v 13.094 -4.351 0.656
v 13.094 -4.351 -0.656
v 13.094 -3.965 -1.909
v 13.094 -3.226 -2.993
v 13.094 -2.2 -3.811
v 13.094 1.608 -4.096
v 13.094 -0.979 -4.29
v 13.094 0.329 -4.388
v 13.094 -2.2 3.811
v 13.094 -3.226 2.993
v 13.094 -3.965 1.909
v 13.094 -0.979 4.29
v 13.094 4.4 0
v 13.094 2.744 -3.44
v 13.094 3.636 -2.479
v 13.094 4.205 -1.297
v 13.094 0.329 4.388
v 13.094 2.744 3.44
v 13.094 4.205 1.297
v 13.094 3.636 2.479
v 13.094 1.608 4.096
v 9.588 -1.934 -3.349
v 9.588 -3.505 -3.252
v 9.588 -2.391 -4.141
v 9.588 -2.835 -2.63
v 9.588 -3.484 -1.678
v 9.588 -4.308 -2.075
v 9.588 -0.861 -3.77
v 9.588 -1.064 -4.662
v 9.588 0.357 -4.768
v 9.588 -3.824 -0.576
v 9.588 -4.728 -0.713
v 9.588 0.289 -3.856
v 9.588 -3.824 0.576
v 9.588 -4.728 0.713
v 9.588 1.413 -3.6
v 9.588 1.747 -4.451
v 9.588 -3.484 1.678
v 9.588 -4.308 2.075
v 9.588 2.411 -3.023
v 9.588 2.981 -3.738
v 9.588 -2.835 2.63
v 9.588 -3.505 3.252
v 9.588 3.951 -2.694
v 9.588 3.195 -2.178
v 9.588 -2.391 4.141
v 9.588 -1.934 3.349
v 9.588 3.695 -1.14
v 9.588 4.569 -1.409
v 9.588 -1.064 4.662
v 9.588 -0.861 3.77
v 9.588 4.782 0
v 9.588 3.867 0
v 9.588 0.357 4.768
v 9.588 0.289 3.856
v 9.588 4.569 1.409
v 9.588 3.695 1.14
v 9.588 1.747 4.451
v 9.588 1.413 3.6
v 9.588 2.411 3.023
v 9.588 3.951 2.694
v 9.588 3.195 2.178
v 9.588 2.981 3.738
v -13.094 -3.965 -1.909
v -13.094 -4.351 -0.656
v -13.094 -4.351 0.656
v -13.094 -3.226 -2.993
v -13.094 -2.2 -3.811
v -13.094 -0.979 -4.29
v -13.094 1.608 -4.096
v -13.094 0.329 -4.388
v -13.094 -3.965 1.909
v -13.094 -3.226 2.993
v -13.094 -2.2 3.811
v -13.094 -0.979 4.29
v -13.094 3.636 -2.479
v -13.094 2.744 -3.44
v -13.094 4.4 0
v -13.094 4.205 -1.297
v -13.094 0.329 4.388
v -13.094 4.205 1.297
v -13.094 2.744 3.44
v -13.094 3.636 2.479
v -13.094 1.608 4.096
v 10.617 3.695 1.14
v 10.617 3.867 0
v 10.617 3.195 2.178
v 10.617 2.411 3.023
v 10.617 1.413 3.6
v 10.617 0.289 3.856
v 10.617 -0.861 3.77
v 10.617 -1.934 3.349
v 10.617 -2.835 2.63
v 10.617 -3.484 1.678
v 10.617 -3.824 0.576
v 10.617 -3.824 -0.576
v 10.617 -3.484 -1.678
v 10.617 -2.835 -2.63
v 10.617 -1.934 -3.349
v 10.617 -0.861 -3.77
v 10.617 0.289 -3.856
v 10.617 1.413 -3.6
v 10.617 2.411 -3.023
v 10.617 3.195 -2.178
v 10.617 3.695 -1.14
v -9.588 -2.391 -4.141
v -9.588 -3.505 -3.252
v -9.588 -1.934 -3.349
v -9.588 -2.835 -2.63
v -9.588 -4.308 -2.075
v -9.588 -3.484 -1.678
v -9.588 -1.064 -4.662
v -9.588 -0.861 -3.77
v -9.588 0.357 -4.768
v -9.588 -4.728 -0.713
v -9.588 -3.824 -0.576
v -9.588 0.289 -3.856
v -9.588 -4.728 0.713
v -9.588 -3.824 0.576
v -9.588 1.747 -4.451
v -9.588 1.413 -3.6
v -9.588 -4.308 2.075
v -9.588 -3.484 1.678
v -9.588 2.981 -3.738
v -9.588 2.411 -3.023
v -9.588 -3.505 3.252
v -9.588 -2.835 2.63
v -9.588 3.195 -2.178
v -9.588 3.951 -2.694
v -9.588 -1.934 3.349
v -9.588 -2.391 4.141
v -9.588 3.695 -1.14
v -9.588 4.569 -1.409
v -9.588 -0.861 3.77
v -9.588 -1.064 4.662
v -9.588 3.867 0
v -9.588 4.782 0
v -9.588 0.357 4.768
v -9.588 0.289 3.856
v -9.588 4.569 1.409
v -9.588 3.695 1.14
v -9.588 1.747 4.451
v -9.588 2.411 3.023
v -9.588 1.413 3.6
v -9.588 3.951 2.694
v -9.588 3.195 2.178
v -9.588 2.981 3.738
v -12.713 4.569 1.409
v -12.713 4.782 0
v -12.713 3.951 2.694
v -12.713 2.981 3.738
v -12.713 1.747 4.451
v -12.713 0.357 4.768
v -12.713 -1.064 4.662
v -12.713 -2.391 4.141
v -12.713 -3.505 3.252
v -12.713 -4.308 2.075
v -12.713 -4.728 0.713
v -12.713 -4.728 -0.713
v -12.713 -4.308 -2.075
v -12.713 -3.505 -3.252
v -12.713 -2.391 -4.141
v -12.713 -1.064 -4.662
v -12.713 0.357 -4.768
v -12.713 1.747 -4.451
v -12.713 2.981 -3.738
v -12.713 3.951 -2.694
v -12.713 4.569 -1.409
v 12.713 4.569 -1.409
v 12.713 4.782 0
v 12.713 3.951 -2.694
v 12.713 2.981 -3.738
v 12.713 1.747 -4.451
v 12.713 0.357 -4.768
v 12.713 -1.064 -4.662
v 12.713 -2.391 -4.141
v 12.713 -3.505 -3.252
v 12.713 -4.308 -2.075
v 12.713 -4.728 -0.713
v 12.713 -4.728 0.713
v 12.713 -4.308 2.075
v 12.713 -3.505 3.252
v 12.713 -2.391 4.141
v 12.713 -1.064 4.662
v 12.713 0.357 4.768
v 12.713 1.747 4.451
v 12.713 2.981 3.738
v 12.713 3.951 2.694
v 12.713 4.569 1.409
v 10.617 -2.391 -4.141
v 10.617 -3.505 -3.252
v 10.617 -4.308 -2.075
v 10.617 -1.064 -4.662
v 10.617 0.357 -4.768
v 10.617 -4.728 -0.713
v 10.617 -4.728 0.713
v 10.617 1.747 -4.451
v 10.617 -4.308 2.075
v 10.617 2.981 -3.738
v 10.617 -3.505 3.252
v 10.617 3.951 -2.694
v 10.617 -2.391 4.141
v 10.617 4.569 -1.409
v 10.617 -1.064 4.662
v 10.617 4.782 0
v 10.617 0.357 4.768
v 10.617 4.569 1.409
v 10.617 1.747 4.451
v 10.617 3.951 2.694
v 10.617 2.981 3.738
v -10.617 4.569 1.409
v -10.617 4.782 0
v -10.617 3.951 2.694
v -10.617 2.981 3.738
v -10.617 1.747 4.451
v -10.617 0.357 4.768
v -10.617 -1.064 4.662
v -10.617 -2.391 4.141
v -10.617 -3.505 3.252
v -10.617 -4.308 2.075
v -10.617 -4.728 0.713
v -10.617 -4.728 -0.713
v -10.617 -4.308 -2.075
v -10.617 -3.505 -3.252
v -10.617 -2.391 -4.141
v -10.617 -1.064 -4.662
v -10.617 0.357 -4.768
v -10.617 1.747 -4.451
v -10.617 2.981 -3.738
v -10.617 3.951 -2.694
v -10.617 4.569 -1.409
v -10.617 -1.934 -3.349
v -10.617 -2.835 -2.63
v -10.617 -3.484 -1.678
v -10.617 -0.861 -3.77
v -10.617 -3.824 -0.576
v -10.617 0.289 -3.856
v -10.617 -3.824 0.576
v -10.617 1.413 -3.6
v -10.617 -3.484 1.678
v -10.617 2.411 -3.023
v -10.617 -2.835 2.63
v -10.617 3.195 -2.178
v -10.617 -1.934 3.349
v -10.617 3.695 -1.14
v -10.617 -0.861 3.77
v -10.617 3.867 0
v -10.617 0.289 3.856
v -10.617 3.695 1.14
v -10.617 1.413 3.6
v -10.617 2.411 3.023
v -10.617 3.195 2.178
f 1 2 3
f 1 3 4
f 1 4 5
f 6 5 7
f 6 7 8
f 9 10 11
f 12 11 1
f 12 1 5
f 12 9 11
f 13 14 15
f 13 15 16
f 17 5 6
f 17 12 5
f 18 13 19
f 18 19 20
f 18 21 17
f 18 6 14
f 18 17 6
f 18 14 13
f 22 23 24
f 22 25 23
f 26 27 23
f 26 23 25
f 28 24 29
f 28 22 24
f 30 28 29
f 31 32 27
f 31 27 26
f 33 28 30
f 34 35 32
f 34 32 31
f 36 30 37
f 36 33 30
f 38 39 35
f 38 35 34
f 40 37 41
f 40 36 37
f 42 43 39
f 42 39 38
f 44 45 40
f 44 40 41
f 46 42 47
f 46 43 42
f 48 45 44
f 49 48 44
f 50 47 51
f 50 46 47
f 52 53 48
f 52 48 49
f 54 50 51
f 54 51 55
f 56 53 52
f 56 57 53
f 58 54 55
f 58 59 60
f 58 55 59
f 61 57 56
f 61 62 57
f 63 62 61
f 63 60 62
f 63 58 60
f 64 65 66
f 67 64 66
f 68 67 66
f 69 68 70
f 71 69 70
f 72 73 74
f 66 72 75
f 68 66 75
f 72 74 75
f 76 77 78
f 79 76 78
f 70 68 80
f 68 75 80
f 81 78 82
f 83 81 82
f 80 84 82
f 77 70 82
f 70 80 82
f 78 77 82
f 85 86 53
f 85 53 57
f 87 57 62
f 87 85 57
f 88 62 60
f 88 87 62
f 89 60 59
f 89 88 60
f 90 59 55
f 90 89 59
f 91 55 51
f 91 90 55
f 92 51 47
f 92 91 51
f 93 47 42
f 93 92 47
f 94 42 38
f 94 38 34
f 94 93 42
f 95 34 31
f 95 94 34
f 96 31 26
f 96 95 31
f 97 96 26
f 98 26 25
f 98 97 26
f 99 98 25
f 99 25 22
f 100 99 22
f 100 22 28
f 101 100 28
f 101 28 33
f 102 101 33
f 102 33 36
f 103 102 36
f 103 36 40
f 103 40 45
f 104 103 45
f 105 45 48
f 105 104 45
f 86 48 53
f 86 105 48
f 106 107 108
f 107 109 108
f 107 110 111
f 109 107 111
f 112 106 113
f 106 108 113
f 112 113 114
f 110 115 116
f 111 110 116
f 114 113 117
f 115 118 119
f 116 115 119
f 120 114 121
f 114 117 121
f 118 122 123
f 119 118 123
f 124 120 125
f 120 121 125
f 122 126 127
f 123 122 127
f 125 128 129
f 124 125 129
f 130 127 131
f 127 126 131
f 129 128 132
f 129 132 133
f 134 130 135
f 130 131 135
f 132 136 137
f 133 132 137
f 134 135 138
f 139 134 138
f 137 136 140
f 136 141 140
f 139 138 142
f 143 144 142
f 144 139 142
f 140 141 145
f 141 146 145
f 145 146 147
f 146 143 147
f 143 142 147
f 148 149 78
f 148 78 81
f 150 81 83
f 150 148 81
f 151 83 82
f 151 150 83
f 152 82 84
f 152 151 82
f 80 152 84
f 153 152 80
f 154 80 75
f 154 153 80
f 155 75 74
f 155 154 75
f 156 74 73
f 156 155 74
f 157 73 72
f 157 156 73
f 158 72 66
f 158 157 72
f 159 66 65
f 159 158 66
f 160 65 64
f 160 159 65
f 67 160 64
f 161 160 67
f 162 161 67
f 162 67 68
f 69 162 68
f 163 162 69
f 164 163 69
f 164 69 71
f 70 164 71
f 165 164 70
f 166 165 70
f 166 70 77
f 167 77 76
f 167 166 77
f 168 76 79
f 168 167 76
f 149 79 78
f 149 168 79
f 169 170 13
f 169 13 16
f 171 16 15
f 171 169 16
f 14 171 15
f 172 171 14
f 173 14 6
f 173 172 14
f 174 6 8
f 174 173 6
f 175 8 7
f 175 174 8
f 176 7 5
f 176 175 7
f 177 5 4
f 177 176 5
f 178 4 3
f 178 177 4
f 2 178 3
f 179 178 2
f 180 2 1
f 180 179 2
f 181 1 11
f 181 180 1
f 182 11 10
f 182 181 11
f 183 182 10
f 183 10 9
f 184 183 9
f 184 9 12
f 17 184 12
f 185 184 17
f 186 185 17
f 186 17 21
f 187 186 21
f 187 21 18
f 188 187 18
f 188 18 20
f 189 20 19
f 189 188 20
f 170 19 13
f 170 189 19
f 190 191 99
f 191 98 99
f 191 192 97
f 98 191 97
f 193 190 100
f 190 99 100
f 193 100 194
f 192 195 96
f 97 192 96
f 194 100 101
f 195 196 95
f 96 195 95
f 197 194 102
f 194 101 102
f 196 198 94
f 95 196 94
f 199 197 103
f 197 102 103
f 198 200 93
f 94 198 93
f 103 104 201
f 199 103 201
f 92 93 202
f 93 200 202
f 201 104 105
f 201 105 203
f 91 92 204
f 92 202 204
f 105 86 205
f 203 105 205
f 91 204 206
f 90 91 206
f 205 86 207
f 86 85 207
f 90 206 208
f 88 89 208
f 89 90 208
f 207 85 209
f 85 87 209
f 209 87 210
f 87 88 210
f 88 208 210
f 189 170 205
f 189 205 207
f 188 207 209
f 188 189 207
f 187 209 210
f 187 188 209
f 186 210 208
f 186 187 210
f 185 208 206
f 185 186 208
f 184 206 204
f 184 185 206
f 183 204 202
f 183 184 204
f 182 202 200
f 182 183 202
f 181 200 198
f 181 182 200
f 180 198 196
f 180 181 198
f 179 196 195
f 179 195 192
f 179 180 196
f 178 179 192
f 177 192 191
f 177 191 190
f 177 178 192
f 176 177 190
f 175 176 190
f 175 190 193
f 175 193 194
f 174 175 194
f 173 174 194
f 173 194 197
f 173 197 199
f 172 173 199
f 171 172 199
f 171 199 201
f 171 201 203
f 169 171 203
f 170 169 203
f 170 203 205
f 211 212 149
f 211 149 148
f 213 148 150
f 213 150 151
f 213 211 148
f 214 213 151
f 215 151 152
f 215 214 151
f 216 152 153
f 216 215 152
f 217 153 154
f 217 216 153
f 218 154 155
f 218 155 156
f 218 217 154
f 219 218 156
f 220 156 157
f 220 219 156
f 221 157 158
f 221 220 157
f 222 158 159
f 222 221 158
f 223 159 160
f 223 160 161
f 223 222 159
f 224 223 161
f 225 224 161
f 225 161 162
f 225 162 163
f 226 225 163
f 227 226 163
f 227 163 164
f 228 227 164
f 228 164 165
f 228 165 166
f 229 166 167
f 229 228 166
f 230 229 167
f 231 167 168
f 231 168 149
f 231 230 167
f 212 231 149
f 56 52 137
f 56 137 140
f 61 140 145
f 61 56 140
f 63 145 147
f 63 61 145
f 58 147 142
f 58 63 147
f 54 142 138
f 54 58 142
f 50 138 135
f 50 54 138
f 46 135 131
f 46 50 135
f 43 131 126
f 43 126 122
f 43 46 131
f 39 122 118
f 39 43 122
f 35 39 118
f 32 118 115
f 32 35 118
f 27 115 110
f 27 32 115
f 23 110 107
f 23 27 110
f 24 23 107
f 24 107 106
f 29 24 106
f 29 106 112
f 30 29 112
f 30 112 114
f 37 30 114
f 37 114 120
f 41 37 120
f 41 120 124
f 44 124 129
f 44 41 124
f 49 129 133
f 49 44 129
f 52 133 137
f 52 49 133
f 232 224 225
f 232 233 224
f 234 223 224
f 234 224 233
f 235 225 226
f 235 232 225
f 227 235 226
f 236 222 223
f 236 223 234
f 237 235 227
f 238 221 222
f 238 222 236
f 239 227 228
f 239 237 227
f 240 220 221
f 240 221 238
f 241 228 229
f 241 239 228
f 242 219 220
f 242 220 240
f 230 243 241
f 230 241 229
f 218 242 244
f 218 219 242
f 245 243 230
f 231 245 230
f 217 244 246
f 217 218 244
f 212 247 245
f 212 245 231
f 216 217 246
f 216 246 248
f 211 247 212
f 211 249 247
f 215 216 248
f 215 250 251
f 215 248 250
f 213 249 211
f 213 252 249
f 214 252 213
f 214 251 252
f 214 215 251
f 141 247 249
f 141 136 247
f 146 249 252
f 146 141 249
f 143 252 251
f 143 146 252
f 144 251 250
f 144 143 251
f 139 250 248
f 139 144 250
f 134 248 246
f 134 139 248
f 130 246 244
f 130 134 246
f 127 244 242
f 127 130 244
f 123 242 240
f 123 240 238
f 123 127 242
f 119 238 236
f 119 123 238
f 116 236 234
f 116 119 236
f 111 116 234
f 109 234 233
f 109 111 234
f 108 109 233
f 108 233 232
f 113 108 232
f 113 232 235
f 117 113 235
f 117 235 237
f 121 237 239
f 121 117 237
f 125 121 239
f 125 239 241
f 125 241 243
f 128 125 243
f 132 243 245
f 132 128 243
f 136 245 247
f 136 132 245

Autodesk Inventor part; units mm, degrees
sketch "Sketch_1" plane through (0, 0, 0) normal (0, 0, 1) x (1, 0, 0)
  line L0 (13.0937, 0) -> (-13.0937, 0)
  line L1 (-13.0937, 0) -> (-13.0937, 4.4005)
  line L2 (-13.0937, 4.4005) -> (-12.7127, 4.7816)
  line L3 (-12.7127, 4.7816) -> (-10.6172, 4.7816)
  line L4 (-10.6172, 4.7816) -> (-10.6172, 3.8672)
  line L5 (-10.6172, 3.8672) -> (-9.5885, 3.8672)
  line L6 (-9.5885, 3.8672) -> (-9.5885, 4.7816)
  line L7 (-9.5885, 4.7816) -> (9.5885, 4.7816)
  line L8 (9.5885, 4.7816) -> (9.5885, 3.8672)
  line L9 (9.5885, 3.8672) -> (10.6172, 3.8672)
  line L10 (10.6172, 3.8672) -> (10.6172, 4.7816)
  line L11 (10.6172, 4.7816) -> (12.7127, 4.7816)
  line L12 (12.7127, 4.7816) -> (13.0937, 4.4005)
  line L13 (13.0937, 4.4005) -> (13.0937, 0)
  line L14 (13.0937, 0) -> (-13.0937, 0)
revolve "Revolution1" add sketch "Sketch_1" angle 360 about axis through (13.0937, 0, 0) along (1, 0, 0)
ref_plane "p1_XY" through (0, 0, 4.7816) normal (1, 0, 0) x (0, 0, -1)
ref_plane "p1_YZ" through (0, 0, 4.7816) normal (0, 0, -1) x (0, 1, 0)
ref_plane "p1_ZX" through (0, 0, 4.7816) normal (0, 1, 0) x (1, 0, 0)
ref_plane "p2_XY" through (0, 0, -4.7816) normal (1, 0, 0) x (0, 0, -1)
ref_plane "p2_YZ" through (0, 0, -4.7816) normal (0, 0, -1) x (0, 1, 0)
ref_plane "p2_ZX" through (0, 0, -4.7816) normal (0, 1, 0) x (1, 0, 0)
ref_plane "pin_XY" through (0, 0, 0) normal (1, 0, 0) x (0, 0, -1)
ref_plane "pin_YZ" through (0, 0, 0) normal (0, 0, -1) x (0, 1, 0)
ref_plane "pin_ZX" through (0, 0, 0) normal (0, 1, 0) x (1, 0, 0)
ref_plane "rr1_XY" through (10.1029, 0, 0) normal (1, 0, 0) x (0, 0, -1)
ref_plane "rr1_YZ" through (10.1029, 0, 0) normal (0, 0, -1) x (0, 1, 0)
ref_plane "rr1_ZX" through (10.1029, 0, 0) normal (0, 1, 0) x (1, 0, 0)
ref_plane "rr2_XY" through (-10.1029, 0, 0) normal (1, 0, 0) x (0, 0, -1)
ref_plane "rr2_YZ" through (-10.1029, 0, 0) normal (0, 0, -1) x (0, 1, 0)
ref_plane "rr2_ZX" through (-10.1029, 0, 0) normal (0, 1, 0) x (1, 0, 0)
ref_plane "w21_XY" through (13.0937, 0, 0) normal (0, 1, 0) x (1, 0, 0)
ref_plane "w21_YZ" through (13.0937, 0, 0) normal (1, 0, 0) x (0, 0, -1)
ref_plane "w21_ZX" through (13.0937, 0, 0) normal (0, 0, -1) x (0, 1, 0)
ref_plane "w22_XY" through (-13.0937, 0, 0) normal (0, 1, 0) x (1, 0, 0)
ref_plane "w22_YZ" through (-13.0937, 0, 0) normal (1, 0, 0) x (0, 0, -1)
ref_plane "w22_ZX" through (-13.0937, 0, 0) normal (0, 0, -1) x (0, 1, 0)
equation "\"BendRadius\" = Thickness"
equation "\"BendReliefWidth\" = Thickness"
equation "\"BendReliefDepth\" = 0.5 * Thickness"
equation "\"CornerReliefSize\" = 4 * Thickness"
equation "\"MinimumRemnant\" = 2 * Thickness"
equation "\"TransitionRadius\" = BendRadius"
equation "\"JacobiRadiusSize\" = Thickness"
equation "\"GapSize\" = Thickness"
equation "\"Thickness\" = 3.048"
properties part number "D-8383"
